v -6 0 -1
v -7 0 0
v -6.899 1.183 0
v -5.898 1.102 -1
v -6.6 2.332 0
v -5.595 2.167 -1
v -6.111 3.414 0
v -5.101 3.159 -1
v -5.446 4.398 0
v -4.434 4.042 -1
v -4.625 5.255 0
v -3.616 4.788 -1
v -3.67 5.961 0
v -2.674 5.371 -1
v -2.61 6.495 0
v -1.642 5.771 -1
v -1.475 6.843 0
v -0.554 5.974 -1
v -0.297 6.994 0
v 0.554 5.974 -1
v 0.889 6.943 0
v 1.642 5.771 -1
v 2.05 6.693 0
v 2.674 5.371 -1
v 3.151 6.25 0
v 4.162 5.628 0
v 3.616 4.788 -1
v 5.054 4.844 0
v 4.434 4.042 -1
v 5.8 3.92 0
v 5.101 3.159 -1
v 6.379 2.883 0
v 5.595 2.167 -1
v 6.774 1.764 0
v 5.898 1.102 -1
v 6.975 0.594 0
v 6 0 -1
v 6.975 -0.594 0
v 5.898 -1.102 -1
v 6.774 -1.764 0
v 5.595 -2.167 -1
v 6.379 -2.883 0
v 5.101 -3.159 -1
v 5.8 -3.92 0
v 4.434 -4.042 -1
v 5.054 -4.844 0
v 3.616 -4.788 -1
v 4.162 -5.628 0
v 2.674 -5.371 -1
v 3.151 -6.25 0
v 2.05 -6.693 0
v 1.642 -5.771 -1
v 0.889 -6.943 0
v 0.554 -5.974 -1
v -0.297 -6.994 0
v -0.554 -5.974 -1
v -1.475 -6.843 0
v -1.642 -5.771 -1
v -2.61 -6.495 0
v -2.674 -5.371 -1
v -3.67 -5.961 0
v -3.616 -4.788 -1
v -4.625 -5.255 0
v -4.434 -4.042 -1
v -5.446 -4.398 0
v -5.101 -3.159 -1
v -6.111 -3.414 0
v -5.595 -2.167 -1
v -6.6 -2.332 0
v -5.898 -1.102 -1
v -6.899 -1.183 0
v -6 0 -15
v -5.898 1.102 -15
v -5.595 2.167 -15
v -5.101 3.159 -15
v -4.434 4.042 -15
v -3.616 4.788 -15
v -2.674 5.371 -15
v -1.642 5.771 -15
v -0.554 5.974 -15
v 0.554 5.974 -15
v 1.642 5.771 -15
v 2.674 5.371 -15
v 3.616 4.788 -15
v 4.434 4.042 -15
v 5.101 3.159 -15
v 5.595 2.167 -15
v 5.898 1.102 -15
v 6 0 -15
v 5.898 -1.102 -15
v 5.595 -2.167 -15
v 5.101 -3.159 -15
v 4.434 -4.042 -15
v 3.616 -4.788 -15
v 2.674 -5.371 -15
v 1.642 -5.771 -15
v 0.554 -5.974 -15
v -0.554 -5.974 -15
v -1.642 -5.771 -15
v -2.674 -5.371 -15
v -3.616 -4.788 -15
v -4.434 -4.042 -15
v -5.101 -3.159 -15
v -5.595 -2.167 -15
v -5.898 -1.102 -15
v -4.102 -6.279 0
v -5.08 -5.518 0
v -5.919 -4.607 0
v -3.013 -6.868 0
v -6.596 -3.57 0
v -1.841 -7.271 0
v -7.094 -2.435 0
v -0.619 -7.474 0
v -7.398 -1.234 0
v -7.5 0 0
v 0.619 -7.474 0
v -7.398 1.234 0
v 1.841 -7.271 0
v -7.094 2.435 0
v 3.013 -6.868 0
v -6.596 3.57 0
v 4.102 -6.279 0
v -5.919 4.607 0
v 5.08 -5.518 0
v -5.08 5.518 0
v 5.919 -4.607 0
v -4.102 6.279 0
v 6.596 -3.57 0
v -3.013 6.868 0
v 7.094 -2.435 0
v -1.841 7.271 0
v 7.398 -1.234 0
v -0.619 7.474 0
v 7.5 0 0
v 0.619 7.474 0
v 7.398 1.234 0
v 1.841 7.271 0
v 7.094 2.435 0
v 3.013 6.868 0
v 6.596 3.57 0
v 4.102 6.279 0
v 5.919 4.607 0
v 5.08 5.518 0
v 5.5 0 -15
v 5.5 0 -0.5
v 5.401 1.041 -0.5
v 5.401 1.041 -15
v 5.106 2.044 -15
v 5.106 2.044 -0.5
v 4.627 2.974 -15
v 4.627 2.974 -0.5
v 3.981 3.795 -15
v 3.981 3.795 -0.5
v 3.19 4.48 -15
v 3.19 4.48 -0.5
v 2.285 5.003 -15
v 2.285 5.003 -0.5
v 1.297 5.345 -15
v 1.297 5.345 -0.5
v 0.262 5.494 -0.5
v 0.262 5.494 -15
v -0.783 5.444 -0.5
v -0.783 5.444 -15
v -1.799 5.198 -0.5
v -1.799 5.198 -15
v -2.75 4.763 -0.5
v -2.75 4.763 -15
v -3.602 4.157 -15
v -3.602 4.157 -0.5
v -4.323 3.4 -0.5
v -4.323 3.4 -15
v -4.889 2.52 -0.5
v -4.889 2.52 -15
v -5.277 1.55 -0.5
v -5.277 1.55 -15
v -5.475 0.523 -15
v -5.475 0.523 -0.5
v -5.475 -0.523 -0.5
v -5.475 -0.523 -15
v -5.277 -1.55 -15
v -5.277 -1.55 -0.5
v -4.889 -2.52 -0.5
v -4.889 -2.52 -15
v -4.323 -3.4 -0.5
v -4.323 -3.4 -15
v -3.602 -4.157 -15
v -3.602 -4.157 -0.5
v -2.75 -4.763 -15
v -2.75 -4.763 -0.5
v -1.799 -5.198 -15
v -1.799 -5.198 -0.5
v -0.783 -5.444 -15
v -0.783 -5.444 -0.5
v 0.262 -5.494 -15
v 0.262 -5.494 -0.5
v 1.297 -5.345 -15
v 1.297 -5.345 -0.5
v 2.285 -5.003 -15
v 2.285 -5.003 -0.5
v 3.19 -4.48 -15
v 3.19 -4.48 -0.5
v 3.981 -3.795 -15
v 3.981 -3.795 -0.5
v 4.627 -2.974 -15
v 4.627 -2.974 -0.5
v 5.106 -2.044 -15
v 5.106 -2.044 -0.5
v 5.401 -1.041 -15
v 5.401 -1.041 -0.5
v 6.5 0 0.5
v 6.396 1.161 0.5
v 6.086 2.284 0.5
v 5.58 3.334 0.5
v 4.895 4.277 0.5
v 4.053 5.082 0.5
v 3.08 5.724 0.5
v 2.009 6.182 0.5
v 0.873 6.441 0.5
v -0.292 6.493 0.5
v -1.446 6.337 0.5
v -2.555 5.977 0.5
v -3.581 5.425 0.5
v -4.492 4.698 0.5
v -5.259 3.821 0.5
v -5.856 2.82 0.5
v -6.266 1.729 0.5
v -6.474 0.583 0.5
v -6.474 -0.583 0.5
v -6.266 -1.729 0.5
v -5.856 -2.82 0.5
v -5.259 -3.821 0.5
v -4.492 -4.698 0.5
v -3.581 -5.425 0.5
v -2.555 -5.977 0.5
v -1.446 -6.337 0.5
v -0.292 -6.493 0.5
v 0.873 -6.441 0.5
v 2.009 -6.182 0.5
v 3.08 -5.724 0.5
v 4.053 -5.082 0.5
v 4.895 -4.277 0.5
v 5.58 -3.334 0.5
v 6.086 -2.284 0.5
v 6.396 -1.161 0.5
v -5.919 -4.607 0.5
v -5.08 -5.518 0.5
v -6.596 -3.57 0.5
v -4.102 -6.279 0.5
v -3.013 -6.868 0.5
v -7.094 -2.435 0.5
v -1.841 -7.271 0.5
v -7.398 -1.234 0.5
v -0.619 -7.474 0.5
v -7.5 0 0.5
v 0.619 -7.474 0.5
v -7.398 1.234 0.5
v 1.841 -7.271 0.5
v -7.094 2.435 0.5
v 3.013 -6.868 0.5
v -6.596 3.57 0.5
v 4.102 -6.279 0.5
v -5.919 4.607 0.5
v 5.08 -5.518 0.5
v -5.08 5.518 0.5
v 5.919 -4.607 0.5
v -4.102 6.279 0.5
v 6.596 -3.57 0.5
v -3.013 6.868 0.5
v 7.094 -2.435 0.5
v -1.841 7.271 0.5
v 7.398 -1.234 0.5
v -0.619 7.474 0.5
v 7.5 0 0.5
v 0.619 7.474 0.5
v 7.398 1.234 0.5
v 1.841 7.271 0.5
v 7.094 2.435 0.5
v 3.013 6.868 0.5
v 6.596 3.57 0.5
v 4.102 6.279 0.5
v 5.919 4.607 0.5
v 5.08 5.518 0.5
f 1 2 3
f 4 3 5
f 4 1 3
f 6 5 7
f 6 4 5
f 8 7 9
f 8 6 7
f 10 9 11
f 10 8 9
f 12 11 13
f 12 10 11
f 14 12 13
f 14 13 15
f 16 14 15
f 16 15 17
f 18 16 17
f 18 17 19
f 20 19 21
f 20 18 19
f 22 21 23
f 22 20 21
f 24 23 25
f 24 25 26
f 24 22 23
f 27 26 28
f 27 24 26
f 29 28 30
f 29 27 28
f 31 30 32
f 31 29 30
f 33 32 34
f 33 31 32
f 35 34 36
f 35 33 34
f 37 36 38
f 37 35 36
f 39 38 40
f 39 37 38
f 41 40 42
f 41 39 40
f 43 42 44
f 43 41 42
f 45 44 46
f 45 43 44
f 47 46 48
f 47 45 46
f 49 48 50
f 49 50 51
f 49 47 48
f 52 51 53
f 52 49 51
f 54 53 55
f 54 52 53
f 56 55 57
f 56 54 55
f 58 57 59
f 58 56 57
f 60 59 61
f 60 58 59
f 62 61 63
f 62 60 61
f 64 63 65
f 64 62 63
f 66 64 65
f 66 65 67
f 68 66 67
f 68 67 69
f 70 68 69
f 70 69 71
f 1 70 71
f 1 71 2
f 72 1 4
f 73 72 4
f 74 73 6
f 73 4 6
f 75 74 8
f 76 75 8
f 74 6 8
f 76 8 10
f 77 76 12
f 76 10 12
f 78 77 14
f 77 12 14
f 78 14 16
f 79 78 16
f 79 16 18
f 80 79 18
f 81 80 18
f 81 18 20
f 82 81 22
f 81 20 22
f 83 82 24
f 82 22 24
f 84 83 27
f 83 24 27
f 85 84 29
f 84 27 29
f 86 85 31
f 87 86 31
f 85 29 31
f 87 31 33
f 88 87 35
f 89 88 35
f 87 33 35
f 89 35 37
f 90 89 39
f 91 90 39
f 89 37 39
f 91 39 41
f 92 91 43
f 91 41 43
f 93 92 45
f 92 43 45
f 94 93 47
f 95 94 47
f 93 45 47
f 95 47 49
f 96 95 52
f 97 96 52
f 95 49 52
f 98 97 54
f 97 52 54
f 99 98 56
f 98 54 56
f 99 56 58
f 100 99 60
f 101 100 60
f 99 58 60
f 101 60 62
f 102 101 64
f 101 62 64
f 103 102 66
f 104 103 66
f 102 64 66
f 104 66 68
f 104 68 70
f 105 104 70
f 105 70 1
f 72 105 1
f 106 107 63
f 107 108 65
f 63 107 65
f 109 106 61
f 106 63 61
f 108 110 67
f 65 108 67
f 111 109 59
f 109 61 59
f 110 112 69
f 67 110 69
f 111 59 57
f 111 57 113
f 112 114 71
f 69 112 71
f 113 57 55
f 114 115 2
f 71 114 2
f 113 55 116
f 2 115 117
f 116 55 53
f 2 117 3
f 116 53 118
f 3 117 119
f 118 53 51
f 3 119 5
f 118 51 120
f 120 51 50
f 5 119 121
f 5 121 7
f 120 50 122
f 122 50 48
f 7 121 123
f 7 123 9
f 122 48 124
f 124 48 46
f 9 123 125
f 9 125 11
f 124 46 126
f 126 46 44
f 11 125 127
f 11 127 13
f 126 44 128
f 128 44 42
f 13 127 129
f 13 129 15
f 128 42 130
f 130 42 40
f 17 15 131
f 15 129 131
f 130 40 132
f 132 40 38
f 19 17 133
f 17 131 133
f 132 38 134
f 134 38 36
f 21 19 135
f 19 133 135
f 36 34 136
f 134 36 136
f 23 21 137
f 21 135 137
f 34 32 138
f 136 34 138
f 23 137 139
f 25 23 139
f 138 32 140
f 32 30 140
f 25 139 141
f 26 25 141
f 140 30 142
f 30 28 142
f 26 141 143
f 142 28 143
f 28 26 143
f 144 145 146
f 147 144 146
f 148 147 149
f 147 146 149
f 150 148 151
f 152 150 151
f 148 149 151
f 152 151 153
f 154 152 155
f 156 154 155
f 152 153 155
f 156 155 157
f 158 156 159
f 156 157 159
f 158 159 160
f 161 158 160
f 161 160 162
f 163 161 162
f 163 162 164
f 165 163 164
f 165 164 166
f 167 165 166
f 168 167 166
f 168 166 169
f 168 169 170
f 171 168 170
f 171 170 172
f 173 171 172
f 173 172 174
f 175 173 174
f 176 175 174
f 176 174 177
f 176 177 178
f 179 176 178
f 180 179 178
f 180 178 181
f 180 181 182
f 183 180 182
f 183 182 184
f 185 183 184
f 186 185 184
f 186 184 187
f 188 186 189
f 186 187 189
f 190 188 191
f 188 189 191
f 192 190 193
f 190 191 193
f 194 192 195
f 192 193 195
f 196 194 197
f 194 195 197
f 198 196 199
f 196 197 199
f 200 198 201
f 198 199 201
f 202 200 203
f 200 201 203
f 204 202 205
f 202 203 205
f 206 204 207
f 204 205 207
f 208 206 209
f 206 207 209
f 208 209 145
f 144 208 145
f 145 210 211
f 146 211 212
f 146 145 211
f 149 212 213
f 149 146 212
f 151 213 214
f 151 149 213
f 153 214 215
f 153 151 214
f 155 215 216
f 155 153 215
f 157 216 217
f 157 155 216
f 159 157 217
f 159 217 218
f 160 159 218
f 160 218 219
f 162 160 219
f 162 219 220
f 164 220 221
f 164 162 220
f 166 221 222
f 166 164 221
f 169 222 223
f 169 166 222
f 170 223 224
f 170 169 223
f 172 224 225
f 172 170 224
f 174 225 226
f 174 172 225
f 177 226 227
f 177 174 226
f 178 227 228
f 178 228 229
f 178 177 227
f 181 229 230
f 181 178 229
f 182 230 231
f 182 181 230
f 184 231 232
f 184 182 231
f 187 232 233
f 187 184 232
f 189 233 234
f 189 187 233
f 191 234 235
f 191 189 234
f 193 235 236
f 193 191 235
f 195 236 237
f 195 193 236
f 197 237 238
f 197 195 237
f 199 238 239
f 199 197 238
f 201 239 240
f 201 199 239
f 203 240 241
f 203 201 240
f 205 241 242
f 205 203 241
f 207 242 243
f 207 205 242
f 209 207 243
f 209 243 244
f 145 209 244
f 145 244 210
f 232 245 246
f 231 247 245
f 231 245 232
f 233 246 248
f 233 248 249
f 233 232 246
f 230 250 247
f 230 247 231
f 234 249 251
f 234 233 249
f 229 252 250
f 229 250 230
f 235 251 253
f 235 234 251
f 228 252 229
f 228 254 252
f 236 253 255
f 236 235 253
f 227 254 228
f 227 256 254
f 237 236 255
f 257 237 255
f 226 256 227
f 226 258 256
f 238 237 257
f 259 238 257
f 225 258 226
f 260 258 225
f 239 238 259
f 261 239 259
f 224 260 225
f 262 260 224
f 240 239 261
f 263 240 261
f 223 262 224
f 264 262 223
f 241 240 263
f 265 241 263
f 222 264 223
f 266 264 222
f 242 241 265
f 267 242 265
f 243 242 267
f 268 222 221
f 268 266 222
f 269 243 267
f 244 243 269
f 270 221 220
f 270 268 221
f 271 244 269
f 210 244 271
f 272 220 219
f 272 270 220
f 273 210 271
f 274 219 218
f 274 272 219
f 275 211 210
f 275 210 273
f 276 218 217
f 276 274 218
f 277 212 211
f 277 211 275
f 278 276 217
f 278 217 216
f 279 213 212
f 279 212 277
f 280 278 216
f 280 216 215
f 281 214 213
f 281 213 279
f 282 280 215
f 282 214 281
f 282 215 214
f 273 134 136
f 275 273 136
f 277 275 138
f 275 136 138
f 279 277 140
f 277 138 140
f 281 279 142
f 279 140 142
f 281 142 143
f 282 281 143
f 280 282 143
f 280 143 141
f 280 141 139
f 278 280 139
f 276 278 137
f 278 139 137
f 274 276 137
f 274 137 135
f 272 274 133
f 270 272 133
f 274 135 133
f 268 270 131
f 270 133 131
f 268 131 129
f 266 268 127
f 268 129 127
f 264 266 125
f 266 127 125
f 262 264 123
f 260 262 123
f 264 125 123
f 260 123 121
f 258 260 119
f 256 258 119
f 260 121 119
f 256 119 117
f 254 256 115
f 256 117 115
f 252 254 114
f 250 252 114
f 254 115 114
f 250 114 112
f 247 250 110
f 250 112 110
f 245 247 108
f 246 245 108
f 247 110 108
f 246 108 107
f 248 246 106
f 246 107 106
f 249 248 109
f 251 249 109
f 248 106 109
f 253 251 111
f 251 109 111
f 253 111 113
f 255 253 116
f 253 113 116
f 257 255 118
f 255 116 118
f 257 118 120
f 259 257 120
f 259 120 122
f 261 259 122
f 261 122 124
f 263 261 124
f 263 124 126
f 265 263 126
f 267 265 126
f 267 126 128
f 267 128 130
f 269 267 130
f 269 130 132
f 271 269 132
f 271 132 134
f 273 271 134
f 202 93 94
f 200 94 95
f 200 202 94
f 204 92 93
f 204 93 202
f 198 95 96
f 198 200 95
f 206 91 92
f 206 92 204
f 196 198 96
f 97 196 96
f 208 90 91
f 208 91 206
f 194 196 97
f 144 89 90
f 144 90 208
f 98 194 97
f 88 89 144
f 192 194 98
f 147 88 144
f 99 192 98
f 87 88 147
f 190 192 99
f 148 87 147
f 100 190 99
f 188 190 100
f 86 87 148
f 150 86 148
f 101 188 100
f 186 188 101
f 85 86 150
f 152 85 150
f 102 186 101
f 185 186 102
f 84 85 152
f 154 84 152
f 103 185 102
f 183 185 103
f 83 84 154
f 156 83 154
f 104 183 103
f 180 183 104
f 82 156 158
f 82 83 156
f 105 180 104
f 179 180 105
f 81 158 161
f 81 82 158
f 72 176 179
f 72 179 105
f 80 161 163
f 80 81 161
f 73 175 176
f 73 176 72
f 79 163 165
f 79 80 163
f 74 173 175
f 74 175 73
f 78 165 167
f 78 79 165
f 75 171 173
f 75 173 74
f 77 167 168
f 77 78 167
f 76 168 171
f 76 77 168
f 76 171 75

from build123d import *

# Parameters (mm, degrees)
SKETCH1_R           = 7.5
BOSS_EXTRUDE1_DEPTH = 0.5
SKETCH2_R           = 6
BOSS_EXTRUDE2_DEPTH = 15
SKETCH3_R           = 5.5
CUT_EXTRUDE1_DEPTH  = 19.781639971
CHAMFER1_SIZE       = 1


with BuildPart() as part:
    # Sketch1 → Boss-Extrude1 (new body)
    with BuildSketch(Plane.XY):
        Circle(SKETCH1_R)
    extrude(amount=BOSS_EXTRUDE1_DEPTH)

    # Sketch2 → Boss-Extrude2 (add)
    with BuildSketch(Plane(origin=(0, 0, 0), x_dir=(-1, 0, 0), z_dir=(0, 0, -1))):
        Circle(SKETCH2_R)
    extrude(amount=BOSS_EXTRUDE2_DEPTH)

    # Sketch3 → Cut-Extrude1 (cut, through all)
    with BuildSketch(Plane.XY.offset(0.5)):
        Circle(SKETCH3_R)
    extrude(amount=-CUT_EXTRUDE1_DEPTH, mode=Mode.SUBTRACT)

    # Chamfer1
    chamfer1_edges = [part.edges().sort_by_distance(p)[0] for p in [
        (-5.5, 0, 0.5),
        (6, 0, 0),
    ]]
    chamfer(chamfer1_edges, length=CHAMFER1_SIZE)


solid = part.part
